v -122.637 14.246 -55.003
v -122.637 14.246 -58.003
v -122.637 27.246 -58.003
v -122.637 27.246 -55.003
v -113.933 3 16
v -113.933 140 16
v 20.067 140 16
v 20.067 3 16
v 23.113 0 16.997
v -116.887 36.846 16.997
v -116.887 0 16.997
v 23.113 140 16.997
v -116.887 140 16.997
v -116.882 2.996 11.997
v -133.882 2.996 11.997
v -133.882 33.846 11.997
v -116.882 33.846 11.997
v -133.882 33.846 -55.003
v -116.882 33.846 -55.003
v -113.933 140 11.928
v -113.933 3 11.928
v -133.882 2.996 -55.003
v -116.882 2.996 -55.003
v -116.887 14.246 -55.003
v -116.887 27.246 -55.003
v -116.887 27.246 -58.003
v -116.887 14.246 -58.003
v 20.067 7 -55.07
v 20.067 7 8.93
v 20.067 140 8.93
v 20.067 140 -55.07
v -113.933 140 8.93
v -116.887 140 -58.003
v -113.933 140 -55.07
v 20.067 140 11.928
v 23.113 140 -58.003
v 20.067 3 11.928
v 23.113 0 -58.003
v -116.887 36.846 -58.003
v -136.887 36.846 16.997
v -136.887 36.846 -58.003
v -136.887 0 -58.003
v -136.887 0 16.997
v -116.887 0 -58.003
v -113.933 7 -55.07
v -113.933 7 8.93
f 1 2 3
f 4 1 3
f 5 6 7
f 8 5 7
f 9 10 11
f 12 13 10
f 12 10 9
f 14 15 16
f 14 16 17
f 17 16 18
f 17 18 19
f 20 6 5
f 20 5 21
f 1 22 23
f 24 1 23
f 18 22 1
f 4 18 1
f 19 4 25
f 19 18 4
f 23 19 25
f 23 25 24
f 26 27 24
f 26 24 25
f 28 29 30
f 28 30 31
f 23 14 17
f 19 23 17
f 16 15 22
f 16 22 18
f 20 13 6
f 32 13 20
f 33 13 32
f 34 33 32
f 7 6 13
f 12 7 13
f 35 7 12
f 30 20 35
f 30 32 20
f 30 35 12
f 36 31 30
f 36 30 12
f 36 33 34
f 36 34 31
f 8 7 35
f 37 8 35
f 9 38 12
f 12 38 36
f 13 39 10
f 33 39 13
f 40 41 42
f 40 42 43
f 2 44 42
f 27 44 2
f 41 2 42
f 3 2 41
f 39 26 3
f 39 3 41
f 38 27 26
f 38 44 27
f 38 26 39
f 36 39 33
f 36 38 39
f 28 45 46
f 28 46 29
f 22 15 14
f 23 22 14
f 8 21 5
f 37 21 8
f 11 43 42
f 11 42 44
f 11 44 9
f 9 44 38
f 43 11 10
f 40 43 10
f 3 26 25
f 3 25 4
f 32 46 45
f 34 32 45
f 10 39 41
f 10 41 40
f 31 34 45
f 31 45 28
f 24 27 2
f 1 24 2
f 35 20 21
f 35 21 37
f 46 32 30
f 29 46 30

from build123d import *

# Parameters (mm, degrees)
SKETCH1_W           = 140
SKETCH1_H           = 70
BOSS_EXTRUDE1_DEPTH = 140
SKETCH2_W           = 134
SKETCH2_H           = 64
CUT_EXTRUDE1_DEPTH  = 133
SKETCH5_W           = 75.000260503
SKETCH5_H           = 36.846473491
BOSS_EXTRUDE3_DEPTH = 20
SKETCH6_W           = 5.75
SKETCH6_H           = 13
CUT_EXTRUDE2_DEPTH  = 3
SKETCH9_W           = 17
SKETCH9_H           = 30.85
CUT_EXTRUDE3_DEPTH  = 67
SKETCH11_W          = 140
SKETCH11_H          = 140
BOSS_EXTRUDE5_DEPTH = 5
SKETCH15_W          = 134
SKETCH15_H          = 4.072298399
CUT_EXTRUDE4_DEPTH  = 137


with BuildPart() as part:
    # Sketch1 → Boss-Extrude1 (new body)
    with BuildSketch(Plane(origin=(0, 0, 0), x_dir=(1, 0, 0), z_dir=(0, 1, 0))):
        with Locations((-46.886792453, 23.003144654)):
            Rectangle(SKETCH1_W, SKETCH1_H)
    extrude(amount=BOSS_EXTRUDE1_DEPTH)

    # Sketch2 → Cut-Extrude1 (cut)
    with BuildSketch(Plane(origin=(0, 140, 0), x_dir=(1, 0, 0), z_dir=(0, 1, 0))):
        with Locations((-46.932929257, 23.070074841)):
            Rectangle(SKETCH2_W, SKETCH2_H)
    extrude(amount=-CUT_EXTRUDE1_DEPTH, mode=Mode.SUBTRACT)

    # Sketch5 → Boss-Extrude3 (add)
    with BuildSketch(Plane.ZY.offset(116.886792453)):
        with Locations((-20.503014402, 18.423236746)):
            Rectangle(SKETCH5_W, SKETCH5_H)
    extrude(amount=BOSS_EXTRUDE3_DEPTH)

    # Sketch6 → Cut-Extrude2 (cut)
    with BuildSketch(Plane(origin=(0, 0, -58.003144654), x_dir=(-1, 0, 0), z_dir=(0, 0, -1))):
        with Locations((119.761792453, 20.746473491)):
            Rectangle(SKETCH6_W, SKETCH6_H)
    extrude(amount=-CUT_EXTRUDE2_DEPTH, mode=Mode.SUBTRACT)

    # Sketch9 → Cut-Extrude3 (cut)
    with BuildSketch(Plane.XY.offset(11.996855346)):
        with Locations((-125.382389836, 18.421473491)):
            Rectangle(SKETCH9_W, SKETCH9_H)
    extrude(amount=-CUT_EXTRUDE3_DEPTH, mode=Mode.SUBTRACT)

    # Sketch11 → Boss-Extrude5 (add)
    with BuildSketch(Plane.XY.offset(11.996855346)):
        with Locations((-46.886792453, 70)):
            Rectangle(SKETCH11_W, SKETCH11_H)
    extrude(amount=BOSS_EXTRUDE5_DEPTH)

    # Sketch15 → Cut-Extrude4 (cut)
    with BuildSketch(Plane(origin=(0, 140, 0), x_dir=(1, 0, 0), z_dir=(0, 1, 0))):
        with Locations((-46.932929257, -13.963840405)):
            Rectangle(SKETCH15_W, SKETCH15_H)
    extrude(amount=-CUT_EXTRUDE4_DEPTH, mode=Mode.SUBTRACT)


solid = part.part
